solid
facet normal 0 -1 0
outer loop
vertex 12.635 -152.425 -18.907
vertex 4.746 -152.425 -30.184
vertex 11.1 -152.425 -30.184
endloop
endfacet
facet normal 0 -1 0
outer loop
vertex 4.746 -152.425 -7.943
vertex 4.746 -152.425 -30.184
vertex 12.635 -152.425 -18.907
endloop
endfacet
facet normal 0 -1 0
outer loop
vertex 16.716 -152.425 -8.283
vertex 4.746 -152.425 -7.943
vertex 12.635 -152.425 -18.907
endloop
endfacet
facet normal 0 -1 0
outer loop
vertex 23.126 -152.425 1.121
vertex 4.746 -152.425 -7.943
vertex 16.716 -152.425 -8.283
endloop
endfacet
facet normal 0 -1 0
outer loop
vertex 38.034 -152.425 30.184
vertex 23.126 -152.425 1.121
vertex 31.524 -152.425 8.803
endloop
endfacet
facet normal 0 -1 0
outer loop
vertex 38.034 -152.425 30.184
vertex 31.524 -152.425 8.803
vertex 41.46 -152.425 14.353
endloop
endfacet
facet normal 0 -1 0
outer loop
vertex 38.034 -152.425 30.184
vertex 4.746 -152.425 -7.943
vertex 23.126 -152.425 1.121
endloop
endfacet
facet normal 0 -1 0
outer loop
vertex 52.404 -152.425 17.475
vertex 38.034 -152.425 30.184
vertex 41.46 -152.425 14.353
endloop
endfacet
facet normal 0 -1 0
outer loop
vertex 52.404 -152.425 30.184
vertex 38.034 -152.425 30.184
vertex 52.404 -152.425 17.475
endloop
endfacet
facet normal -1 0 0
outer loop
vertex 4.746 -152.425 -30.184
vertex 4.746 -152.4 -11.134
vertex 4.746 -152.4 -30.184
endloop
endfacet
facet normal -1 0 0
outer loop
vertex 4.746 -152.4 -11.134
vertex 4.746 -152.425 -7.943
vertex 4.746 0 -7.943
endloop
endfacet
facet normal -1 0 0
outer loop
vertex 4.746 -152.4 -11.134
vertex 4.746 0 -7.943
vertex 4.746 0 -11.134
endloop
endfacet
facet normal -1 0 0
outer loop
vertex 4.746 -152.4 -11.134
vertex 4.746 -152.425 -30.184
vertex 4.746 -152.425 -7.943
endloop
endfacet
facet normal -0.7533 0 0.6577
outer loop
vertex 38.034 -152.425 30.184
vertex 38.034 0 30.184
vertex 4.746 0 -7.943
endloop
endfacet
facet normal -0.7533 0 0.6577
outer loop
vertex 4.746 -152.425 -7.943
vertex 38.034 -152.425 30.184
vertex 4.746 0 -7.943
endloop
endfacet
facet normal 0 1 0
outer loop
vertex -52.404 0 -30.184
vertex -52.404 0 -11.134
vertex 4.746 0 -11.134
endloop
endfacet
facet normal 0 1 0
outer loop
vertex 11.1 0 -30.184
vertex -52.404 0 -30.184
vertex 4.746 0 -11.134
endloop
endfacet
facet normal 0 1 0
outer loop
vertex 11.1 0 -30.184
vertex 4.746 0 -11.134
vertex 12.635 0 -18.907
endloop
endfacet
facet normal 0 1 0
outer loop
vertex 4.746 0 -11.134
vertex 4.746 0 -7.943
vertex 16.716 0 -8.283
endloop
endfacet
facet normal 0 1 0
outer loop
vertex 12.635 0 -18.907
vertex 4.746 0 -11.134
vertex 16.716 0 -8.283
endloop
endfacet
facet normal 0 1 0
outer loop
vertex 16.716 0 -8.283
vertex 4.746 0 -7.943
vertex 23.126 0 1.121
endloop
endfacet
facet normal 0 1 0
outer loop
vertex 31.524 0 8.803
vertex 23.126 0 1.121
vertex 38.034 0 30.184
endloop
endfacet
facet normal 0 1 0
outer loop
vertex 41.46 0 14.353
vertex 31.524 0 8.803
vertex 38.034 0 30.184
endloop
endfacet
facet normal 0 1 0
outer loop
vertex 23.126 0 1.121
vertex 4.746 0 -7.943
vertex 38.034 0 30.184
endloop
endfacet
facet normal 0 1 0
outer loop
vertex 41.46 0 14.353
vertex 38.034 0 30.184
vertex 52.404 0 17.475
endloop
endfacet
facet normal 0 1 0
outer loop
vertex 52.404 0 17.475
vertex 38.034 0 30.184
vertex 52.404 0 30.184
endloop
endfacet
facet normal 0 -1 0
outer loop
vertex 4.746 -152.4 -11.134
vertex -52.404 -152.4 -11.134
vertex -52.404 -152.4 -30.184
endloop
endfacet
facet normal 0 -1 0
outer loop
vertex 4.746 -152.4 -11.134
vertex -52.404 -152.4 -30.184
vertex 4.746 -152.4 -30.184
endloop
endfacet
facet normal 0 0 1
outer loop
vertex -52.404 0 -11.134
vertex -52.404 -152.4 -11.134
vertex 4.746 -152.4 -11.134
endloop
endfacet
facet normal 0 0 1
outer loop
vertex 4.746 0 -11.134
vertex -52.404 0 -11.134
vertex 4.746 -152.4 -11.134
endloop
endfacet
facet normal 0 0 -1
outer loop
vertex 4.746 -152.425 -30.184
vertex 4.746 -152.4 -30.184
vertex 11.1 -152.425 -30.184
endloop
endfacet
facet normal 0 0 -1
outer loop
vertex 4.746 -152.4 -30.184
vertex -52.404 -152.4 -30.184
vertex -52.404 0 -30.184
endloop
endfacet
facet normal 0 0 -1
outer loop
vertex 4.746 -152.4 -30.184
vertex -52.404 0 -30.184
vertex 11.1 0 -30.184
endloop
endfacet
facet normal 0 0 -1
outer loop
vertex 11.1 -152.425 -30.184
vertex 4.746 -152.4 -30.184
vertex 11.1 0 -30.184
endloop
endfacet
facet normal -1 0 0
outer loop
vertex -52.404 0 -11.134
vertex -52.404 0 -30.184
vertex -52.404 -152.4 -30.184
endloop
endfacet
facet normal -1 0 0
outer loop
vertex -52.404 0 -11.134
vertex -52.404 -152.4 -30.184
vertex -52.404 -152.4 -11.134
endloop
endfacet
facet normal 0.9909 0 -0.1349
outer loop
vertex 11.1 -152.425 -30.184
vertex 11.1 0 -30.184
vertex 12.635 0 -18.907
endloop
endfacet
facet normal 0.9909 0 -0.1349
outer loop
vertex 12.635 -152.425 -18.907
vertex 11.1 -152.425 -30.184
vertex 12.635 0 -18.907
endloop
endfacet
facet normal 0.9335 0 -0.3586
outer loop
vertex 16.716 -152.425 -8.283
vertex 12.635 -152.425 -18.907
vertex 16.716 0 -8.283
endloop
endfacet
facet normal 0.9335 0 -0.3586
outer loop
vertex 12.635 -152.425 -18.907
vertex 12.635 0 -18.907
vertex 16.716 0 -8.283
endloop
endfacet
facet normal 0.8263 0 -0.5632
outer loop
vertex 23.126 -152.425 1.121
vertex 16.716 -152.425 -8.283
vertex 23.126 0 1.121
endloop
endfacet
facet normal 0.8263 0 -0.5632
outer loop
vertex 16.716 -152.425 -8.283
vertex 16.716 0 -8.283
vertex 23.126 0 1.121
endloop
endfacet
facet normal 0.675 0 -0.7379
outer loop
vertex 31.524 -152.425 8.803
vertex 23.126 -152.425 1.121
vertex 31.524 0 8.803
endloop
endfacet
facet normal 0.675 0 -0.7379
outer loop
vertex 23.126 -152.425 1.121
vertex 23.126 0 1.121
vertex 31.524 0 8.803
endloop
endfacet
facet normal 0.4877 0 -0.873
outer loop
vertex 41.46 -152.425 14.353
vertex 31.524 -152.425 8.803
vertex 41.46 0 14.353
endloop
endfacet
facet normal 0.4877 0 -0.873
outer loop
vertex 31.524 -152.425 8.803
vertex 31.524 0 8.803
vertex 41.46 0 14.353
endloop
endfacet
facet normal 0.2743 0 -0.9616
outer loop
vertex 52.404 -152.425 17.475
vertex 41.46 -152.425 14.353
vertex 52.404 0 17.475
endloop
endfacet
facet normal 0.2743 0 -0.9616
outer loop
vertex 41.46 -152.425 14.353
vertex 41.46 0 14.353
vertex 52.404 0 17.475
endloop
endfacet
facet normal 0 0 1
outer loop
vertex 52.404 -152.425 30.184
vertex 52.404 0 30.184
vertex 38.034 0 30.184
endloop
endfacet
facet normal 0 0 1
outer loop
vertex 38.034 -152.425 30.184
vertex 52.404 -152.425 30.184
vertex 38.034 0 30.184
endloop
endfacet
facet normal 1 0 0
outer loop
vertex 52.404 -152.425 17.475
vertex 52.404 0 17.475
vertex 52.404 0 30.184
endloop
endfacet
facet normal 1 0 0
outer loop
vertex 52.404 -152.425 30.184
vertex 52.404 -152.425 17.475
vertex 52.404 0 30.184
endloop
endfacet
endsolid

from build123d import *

# Parameters (mm, degrees)
F0_W     = 57.15
F0_H     = 19.05
F1_DEPTH = 152.4000018835
F2_DEPTH = 152.4253934622


# Not quite as in the source:
# - ends of sketch curves that miss each other by under 0.0002 mm in the source are joined


with BuildPart() as f1:
    # F0 (on Front) → F1 (new body)
    with BuildSketch(Plane.XZ):
        with Locations((-23.829137, -20.6585566)):
            Rectangle(F0_W, F0_H)
    extrude(amount=F1_DEPTH)

    # F0 (on Front) → F2 (join)
    with BuildSketch(Plane.XZ):
        with BuildLine():
            Line((4.745863, -11.1335566), (4.745863, -30.1835566))
            Line((4.745863, -30.1835566), (11.100308, -30.1835566))
            ThreePointArc((11.100308, -30.1835566), (23.1263213226, 1.121334901), (52.4041128155, 17.4746845664))
            Line((52.4041128155, 17.4746845664), (52.4041116, 30.1835566))
            Line((52.4041116, 30.1835566), (38.0344934, 30.1835566))
            Line((38.0344934, 30.1835566), (4.745863, -7.9430372))
            Line((4.745863, -7.9430372), (4.745863, -11.1335566))
        make_face()
    extrude(amount=F2_DEPTH)


solid = f1.part
